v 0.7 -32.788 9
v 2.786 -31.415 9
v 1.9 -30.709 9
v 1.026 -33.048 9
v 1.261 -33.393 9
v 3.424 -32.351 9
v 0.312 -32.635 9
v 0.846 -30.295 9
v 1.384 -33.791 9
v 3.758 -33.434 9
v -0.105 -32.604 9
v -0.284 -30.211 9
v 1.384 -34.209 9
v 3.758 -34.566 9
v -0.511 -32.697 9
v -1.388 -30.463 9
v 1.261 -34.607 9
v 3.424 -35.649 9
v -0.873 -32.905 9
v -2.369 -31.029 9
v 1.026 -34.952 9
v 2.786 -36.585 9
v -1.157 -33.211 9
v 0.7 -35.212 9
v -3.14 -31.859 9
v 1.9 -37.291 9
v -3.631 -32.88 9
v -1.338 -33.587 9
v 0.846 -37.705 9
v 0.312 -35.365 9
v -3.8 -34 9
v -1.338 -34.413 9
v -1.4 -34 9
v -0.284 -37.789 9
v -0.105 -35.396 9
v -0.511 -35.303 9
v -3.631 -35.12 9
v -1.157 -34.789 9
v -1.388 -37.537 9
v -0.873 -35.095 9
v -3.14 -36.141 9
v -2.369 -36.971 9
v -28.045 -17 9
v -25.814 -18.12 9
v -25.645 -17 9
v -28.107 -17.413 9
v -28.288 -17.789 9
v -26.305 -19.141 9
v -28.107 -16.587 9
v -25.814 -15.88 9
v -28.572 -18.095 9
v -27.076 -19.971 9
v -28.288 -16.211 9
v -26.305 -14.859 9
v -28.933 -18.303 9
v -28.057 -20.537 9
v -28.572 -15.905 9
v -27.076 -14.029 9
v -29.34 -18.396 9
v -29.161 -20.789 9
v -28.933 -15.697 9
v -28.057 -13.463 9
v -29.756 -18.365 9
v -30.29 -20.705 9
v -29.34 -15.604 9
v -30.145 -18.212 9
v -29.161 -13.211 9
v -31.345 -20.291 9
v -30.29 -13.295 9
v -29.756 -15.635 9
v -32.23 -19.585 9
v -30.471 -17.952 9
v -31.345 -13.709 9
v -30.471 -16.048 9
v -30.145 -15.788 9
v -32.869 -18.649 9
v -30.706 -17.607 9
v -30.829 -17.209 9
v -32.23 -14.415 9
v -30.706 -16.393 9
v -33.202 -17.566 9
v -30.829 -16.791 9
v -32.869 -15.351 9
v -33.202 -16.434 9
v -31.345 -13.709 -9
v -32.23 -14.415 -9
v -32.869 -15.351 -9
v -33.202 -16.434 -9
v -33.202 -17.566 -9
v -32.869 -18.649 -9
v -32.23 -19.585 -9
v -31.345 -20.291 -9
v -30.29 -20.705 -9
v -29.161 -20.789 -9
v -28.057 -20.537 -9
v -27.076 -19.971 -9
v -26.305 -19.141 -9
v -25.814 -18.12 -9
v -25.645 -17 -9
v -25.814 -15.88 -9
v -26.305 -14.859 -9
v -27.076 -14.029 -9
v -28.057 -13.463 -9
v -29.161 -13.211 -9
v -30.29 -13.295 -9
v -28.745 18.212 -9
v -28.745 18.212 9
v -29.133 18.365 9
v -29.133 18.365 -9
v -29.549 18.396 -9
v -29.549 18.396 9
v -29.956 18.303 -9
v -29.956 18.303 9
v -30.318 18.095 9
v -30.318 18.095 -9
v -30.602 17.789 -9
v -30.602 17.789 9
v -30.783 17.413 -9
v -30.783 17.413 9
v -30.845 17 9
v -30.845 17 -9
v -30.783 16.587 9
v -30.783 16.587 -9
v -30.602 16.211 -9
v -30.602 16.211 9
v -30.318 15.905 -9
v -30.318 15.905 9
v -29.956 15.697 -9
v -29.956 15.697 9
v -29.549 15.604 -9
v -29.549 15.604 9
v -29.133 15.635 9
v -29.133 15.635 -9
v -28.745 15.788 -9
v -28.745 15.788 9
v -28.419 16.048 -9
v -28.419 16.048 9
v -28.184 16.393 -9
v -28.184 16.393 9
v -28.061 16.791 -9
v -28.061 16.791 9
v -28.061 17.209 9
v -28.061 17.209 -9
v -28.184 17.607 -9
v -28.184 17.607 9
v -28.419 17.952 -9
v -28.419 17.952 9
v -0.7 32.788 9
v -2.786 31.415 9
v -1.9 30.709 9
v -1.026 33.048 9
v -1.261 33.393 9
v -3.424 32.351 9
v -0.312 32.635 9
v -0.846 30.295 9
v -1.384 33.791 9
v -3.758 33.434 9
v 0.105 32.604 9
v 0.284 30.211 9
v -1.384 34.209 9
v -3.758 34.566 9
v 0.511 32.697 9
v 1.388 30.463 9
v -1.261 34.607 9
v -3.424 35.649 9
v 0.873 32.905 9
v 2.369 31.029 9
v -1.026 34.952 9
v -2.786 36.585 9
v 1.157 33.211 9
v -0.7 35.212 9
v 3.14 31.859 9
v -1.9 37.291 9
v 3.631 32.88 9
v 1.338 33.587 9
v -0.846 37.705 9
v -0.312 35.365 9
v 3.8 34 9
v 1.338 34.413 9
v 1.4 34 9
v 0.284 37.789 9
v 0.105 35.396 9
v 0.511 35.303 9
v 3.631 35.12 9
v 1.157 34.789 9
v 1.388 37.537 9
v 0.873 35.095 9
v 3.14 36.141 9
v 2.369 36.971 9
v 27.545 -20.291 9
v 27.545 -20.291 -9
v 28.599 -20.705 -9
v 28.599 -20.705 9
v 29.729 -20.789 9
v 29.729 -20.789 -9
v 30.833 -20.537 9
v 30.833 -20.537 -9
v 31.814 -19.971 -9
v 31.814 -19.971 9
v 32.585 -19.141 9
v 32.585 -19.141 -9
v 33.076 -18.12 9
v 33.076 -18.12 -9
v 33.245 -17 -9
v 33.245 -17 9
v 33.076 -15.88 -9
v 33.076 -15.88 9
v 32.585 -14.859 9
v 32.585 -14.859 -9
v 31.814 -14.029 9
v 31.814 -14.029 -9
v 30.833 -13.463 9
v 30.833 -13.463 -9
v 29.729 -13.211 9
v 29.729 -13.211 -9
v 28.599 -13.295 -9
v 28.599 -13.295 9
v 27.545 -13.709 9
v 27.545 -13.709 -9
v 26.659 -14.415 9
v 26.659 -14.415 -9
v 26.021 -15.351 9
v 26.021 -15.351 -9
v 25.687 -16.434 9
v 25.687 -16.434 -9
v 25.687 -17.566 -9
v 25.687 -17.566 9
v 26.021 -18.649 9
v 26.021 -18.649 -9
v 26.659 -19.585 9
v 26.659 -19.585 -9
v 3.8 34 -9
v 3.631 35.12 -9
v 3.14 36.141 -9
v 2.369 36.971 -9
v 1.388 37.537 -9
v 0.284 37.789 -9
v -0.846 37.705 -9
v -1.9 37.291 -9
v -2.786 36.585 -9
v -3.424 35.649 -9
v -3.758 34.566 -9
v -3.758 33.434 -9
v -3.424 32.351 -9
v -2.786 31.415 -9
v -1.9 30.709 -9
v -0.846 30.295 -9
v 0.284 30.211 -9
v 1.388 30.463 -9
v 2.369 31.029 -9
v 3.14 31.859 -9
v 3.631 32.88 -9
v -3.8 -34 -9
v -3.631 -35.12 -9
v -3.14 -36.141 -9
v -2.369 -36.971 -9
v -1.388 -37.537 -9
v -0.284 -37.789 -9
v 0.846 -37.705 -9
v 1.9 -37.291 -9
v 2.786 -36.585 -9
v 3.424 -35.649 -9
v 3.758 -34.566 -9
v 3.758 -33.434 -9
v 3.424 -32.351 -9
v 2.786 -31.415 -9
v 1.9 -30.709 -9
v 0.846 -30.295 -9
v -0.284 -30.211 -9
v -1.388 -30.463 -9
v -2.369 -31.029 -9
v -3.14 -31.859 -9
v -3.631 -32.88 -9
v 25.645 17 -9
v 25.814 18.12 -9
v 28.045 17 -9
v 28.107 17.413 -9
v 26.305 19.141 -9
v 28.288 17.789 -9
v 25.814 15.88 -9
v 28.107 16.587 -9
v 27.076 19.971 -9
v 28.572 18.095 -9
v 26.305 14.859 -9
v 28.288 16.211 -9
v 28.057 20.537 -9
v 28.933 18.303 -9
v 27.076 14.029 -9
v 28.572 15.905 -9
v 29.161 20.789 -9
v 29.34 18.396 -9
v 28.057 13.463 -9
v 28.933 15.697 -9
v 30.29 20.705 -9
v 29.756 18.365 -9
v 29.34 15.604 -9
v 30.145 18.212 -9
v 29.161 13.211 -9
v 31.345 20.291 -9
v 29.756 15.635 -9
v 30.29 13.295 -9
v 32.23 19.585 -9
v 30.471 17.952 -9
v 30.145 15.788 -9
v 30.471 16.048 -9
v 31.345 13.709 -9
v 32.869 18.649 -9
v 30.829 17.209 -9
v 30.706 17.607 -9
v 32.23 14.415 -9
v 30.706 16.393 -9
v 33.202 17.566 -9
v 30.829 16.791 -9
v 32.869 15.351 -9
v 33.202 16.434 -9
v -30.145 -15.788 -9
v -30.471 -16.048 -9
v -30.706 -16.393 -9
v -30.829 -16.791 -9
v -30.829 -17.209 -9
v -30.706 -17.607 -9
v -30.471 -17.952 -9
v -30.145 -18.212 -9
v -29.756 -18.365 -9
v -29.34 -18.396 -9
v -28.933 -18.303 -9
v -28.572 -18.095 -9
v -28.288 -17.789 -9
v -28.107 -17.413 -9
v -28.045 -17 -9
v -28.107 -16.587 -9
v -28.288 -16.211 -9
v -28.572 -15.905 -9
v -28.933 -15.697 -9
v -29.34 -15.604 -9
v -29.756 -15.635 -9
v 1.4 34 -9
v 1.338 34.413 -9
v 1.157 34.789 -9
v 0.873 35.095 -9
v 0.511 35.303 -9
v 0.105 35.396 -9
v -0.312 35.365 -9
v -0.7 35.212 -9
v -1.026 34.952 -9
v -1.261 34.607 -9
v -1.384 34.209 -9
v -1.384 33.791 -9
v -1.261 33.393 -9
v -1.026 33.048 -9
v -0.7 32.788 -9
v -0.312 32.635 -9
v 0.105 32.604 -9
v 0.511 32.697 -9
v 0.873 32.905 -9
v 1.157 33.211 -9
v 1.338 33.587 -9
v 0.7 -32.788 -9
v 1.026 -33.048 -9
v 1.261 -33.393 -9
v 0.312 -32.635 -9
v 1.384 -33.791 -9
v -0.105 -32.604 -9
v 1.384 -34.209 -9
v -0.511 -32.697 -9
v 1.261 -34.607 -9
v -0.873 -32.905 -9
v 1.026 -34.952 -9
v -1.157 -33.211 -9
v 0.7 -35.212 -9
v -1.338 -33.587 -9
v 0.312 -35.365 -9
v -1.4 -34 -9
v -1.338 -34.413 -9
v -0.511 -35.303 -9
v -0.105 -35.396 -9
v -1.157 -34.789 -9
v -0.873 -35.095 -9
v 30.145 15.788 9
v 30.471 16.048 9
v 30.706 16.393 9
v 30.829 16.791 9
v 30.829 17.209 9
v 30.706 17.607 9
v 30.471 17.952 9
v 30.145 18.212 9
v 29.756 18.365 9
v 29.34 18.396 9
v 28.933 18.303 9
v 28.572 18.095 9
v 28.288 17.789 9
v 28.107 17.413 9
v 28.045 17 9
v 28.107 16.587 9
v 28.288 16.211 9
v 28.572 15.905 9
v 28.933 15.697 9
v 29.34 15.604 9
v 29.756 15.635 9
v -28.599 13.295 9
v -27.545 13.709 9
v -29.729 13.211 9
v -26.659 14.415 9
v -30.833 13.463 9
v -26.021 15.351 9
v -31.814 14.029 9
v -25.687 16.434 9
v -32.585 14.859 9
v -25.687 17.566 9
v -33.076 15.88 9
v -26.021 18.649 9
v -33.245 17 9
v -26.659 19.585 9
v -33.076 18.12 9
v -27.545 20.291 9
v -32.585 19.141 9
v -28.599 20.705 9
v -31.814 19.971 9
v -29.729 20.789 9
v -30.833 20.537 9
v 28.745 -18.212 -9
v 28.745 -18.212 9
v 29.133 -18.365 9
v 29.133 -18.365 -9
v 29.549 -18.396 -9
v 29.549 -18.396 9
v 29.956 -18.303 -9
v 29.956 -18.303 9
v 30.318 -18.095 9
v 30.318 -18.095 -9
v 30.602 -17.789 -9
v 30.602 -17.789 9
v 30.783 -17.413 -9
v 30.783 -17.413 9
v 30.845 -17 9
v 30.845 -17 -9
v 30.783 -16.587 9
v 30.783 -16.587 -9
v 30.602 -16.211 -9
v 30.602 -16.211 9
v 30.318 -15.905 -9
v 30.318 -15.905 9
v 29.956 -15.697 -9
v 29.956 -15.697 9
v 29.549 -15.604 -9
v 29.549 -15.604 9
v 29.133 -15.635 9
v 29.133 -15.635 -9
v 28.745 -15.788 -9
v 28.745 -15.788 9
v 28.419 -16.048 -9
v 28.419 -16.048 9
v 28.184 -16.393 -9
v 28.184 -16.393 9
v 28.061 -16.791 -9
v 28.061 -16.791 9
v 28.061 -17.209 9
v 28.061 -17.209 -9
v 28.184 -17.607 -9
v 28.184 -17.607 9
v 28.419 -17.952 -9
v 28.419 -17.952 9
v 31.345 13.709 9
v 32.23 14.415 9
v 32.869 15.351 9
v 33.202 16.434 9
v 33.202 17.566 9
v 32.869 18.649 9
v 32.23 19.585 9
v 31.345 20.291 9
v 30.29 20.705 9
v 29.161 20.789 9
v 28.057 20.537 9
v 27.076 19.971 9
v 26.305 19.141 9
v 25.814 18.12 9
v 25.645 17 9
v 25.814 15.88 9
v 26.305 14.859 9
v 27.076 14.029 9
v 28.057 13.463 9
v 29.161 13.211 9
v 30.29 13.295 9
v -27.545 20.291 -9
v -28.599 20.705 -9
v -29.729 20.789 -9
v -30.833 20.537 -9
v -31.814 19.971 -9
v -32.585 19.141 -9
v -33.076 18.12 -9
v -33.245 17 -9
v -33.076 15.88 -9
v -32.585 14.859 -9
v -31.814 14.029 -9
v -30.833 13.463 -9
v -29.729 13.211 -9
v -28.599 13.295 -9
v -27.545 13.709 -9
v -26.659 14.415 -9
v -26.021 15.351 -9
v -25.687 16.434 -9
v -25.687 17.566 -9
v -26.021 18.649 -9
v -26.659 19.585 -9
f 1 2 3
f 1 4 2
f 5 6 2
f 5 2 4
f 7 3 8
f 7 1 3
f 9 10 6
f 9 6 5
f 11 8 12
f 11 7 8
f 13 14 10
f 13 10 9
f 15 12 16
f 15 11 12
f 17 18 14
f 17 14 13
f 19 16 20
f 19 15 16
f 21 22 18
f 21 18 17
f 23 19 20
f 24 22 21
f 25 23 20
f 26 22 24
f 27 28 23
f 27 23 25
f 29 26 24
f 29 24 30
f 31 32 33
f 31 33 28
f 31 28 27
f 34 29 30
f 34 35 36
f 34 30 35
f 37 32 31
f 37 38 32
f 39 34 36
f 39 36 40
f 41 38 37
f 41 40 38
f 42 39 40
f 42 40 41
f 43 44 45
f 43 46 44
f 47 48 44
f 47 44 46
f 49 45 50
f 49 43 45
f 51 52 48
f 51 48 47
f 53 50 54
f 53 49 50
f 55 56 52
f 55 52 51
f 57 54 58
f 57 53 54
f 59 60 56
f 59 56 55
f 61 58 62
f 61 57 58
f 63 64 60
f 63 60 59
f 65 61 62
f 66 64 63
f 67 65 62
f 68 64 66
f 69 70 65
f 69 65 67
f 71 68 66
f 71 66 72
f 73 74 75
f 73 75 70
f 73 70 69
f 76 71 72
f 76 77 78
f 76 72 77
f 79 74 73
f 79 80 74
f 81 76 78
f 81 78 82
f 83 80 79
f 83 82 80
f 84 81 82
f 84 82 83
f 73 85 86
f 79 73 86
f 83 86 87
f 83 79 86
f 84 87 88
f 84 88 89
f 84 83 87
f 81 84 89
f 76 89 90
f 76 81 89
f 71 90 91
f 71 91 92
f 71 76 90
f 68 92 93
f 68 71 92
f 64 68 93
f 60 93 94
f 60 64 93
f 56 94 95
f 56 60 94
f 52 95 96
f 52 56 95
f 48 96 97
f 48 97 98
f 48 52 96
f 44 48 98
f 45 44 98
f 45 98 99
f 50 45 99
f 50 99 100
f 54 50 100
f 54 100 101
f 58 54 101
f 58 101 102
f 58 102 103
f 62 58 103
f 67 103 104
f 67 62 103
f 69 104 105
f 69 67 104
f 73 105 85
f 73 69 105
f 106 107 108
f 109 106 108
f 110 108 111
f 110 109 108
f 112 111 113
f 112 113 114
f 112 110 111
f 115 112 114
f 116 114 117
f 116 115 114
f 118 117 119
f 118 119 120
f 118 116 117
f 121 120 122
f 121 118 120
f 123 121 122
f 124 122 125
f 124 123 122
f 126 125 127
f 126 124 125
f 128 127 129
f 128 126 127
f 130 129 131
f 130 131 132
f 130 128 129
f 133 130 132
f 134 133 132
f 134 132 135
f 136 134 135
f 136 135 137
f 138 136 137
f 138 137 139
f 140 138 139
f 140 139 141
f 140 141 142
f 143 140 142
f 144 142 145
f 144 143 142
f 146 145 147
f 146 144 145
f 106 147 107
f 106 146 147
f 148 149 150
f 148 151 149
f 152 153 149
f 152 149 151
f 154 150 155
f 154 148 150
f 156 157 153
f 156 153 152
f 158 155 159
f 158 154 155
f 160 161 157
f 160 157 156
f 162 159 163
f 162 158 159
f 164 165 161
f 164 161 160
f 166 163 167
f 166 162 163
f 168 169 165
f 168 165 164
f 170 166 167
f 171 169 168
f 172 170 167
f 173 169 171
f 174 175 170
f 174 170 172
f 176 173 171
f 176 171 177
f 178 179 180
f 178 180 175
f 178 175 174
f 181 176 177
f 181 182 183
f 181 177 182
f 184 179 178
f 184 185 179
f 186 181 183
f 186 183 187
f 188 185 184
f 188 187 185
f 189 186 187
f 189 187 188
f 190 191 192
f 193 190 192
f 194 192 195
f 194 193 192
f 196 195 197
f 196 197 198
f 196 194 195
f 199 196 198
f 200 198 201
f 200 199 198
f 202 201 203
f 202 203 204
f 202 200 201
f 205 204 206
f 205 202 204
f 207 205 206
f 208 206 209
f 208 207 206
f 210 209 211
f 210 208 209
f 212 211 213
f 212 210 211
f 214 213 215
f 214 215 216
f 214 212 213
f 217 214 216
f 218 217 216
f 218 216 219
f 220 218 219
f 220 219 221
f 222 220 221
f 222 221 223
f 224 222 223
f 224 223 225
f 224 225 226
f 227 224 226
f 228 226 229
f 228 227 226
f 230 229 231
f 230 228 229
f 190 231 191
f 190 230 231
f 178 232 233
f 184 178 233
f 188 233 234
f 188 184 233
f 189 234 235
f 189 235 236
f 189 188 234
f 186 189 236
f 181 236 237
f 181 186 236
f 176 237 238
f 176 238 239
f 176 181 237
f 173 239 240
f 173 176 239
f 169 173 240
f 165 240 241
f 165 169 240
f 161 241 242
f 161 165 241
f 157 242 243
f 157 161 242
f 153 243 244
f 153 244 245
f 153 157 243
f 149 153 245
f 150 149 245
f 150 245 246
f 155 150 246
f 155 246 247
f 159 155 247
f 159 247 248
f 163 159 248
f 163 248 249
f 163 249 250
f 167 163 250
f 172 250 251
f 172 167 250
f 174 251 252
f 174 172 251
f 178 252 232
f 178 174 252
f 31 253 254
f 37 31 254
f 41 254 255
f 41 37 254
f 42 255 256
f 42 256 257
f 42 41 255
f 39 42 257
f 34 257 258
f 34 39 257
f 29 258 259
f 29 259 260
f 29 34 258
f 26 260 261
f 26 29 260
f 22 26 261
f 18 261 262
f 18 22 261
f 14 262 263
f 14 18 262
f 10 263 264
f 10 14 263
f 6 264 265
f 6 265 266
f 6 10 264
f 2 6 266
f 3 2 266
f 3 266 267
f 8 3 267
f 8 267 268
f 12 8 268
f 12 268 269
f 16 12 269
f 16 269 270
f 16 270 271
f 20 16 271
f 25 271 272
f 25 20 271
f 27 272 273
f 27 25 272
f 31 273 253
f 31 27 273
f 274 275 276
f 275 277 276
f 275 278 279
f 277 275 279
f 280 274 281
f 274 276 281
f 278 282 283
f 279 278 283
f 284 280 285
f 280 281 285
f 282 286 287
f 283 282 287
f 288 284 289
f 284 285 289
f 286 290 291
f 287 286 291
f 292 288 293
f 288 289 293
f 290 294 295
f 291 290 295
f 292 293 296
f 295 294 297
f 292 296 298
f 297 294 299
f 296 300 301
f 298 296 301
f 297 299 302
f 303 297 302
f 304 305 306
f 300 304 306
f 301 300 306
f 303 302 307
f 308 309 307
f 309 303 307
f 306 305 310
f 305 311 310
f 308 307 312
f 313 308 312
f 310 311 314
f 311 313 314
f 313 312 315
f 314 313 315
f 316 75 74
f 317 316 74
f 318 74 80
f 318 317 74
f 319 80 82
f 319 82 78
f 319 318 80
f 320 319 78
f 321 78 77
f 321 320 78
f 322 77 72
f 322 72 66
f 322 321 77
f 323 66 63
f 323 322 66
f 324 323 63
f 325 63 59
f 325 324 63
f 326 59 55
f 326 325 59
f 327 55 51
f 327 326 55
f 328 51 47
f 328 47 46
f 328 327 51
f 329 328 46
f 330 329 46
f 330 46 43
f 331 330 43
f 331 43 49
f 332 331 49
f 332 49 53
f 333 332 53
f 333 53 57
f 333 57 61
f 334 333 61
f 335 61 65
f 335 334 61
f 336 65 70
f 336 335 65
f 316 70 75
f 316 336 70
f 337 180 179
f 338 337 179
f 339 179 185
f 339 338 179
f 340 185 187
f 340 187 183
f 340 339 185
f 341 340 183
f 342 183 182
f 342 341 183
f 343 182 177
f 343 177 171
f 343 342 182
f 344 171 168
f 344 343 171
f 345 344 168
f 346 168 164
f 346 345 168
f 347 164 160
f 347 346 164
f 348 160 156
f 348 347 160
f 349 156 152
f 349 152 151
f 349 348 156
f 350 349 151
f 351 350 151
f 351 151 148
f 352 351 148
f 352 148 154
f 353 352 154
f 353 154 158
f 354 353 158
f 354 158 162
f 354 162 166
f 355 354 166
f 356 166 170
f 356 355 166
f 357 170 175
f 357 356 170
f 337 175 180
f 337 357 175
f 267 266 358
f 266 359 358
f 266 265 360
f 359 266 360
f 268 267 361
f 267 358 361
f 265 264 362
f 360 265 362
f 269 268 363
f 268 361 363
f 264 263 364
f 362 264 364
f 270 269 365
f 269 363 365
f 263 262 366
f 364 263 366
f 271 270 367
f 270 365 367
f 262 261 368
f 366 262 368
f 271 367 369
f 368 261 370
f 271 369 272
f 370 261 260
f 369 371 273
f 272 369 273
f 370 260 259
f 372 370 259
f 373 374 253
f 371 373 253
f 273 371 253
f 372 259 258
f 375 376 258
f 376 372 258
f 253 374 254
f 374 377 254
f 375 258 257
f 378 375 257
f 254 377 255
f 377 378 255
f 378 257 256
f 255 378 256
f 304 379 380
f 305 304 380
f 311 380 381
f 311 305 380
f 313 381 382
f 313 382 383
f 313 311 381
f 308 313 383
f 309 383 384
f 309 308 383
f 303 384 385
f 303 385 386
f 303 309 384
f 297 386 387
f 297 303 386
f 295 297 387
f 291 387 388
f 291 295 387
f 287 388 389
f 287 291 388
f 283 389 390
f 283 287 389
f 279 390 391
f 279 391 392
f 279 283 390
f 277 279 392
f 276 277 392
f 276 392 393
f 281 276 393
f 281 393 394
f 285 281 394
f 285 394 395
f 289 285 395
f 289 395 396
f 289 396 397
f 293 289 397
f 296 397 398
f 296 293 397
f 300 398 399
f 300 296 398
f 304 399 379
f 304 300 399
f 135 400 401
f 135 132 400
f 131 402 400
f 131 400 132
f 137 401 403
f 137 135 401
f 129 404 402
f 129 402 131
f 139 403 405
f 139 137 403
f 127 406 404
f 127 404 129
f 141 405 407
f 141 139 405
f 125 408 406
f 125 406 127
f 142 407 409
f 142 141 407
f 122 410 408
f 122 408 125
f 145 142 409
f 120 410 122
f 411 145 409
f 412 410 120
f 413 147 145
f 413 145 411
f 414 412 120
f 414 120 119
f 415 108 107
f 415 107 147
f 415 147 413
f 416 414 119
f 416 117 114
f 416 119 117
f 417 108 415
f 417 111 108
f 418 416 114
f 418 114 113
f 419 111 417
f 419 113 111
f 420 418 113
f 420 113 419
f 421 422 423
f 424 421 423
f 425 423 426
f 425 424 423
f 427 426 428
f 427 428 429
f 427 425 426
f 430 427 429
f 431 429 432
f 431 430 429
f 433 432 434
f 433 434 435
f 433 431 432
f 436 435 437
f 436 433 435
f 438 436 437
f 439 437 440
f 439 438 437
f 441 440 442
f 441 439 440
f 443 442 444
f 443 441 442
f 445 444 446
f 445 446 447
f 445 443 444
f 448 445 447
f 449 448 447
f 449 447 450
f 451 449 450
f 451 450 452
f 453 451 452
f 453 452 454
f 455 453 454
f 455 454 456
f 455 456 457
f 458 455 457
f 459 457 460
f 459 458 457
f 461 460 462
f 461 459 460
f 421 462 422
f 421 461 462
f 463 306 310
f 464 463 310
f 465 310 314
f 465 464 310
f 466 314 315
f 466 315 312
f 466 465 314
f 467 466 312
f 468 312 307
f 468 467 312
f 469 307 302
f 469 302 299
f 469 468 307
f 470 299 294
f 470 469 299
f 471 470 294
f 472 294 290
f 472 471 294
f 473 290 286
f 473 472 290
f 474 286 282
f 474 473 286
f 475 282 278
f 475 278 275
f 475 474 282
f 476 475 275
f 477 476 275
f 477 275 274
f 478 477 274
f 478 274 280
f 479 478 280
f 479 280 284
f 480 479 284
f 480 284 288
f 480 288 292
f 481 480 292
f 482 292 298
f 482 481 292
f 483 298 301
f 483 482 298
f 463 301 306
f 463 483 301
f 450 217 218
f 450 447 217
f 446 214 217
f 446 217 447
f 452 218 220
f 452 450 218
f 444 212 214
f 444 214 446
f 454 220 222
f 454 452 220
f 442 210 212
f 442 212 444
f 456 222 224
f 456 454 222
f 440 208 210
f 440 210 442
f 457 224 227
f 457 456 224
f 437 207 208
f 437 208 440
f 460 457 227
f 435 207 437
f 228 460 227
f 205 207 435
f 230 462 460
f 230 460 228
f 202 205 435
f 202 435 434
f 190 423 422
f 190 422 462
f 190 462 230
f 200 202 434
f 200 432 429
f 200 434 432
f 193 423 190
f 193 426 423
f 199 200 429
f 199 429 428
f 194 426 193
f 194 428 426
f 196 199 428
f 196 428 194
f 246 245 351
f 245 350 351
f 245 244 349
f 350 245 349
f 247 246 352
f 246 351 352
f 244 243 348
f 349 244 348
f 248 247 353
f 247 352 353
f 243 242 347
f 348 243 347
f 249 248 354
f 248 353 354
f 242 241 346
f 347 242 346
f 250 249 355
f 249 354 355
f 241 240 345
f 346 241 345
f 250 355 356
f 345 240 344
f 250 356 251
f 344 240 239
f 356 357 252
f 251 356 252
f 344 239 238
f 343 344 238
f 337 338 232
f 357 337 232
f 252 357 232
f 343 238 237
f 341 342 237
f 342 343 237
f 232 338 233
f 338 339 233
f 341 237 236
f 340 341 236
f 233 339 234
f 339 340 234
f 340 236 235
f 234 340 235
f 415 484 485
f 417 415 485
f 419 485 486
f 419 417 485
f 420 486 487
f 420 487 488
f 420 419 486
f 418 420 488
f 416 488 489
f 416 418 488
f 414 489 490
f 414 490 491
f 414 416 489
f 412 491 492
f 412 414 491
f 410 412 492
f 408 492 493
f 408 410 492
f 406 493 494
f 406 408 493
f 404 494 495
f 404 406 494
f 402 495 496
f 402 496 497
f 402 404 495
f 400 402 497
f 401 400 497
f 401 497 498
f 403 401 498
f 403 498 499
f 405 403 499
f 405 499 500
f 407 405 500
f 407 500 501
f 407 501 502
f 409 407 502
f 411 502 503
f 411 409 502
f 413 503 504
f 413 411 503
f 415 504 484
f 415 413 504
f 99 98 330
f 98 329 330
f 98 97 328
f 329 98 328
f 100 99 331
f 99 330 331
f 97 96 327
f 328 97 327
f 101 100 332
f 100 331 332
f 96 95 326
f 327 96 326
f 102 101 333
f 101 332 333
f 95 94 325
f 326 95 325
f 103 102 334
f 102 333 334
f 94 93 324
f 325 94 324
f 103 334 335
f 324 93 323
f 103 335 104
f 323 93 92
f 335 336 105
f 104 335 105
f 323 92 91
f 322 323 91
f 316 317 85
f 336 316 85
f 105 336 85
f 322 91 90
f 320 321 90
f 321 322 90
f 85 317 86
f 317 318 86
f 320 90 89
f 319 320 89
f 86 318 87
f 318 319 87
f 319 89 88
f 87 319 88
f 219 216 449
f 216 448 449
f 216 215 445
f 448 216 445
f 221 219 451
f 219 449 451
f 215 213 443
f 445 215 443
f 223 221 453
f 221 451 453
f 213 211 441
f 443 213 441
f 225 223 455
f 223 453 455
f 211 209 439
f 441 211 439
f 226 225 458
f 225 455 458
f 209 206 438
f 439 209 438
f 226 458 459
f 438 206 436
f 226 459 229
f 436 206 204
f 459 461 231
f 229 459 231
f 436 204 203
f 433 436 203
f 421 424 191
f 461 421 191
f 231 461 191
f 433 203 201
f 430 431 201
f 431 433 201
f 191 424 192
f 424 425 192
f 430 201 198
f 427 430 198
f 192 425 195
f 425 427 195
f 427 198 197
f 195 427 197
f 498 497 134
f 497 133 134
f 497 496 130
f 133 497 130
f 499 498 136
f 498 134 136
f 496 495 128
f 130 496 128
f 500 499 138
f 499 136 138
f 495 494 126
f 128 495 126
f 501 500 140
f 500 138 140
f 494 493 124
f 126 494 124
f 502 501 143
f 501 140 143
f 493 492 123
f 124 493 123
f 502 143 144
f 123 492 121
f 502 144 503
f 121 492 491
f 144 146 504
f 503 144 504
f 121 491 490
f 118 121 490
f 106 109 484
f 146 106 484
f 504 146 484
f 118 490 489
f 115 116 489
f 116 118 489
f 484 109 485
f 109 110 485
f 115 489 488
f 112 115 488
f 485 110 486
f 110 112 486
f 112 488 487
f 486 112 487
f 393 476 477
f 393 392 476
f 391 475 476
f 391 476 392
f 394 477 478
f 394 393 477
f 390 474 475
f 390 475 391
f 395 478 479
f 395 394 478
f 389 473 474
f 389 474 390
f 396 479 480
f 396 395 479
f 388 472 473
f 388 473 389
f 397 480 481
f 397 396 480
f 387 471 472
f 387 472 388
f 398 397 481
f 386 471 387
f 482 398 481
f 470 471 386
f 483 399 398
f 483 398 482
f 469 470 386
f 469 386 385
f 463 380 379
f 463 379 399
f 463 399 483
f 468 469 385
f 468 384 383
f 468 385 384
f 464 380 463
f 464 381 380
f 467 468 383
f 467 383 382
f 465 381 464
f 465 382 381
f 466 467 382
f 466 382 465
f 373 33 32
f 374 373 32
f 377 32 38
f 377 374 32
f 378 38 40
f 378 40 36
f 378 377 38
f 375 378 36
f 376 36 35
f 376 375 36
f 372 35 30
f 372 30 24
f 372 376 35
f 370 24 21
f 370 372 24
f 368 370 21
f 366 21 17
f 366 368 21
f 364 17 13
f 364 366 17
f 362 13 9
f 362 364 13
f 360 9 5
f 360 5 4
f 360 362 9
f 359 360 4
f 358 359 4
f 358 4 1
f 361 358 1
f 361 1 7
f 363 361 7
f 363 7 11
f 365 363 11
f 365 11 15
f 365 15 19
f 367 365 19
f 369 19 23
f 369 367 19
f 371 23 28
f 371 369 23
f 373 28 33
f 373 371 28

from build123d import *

# Parameters (mm, degrees)
SCREW_HOLE_R        = 3.8
SCREW_HOLE_R_2      = 1.4
BOSS_EXTRUDE1_DEPTH = 9
CIRPATTERN1_COUNT   = 6


with BuildPart() as part:
    # Screw Hole → Boss-Extrude1 (new, symmetric)
    with BuildSketch(Plane.XY):
        with Locations((0, 34)):
            Circle(SCREW_HOLE_R)
        with Locations((0, 34)):
            Circle(SCREW_HOLE_R_2, mode=Mode.SUBTRACT)
    extrude(amount=BOSS_EXTRUDE1_DEPTH, both=True)


with BuildPart() as cirpattern1_1:
    # CirPattern1: pattern copy
    add(part.part.rotate(Axis((0, 0, 0), (0, 0, 1)), 1 * 360 / CIRPATTERN1_COUNT))


with BuildPart() as cirpattern1_2:
    # CirPattern1: pattern copy
    add(part.part.rotate(Axis((0, 0, 0), (0, 0, 1)), 2 * 360 / CIRPATTERN1_COUNT))


with BuildPart() as cirpattern1_3:
    # CirPattern1: pattern copy
    add(part.part.rotate(Axis((0, 0, 0), (0, 0, 1)), 3 * 360 / CIRPATTERN1_COUNT))


with BuildPart() as cirpattern1_4:
    # CirPattern1: pattern copy
    add(part.part.rotate(Axis((0, 0, 0), (0, 0, 1)), 4 * 360 / CIRPATTERN1_COUNT))


with BuildPart() as cirpattern1_5:
    # CirPattern1: pattern copy
    add(part.part.rotate(Axis((0, 0, 0), (0, 0, 1)), 5 * 360 / CIRPATTERN1_COUNT))


solid = Compound([part.part, cirpattern1_1.part, cirpattern1_2.part, cirpattern1_3.part, cirpattern1_4.part, cirpattern1_5.part])
